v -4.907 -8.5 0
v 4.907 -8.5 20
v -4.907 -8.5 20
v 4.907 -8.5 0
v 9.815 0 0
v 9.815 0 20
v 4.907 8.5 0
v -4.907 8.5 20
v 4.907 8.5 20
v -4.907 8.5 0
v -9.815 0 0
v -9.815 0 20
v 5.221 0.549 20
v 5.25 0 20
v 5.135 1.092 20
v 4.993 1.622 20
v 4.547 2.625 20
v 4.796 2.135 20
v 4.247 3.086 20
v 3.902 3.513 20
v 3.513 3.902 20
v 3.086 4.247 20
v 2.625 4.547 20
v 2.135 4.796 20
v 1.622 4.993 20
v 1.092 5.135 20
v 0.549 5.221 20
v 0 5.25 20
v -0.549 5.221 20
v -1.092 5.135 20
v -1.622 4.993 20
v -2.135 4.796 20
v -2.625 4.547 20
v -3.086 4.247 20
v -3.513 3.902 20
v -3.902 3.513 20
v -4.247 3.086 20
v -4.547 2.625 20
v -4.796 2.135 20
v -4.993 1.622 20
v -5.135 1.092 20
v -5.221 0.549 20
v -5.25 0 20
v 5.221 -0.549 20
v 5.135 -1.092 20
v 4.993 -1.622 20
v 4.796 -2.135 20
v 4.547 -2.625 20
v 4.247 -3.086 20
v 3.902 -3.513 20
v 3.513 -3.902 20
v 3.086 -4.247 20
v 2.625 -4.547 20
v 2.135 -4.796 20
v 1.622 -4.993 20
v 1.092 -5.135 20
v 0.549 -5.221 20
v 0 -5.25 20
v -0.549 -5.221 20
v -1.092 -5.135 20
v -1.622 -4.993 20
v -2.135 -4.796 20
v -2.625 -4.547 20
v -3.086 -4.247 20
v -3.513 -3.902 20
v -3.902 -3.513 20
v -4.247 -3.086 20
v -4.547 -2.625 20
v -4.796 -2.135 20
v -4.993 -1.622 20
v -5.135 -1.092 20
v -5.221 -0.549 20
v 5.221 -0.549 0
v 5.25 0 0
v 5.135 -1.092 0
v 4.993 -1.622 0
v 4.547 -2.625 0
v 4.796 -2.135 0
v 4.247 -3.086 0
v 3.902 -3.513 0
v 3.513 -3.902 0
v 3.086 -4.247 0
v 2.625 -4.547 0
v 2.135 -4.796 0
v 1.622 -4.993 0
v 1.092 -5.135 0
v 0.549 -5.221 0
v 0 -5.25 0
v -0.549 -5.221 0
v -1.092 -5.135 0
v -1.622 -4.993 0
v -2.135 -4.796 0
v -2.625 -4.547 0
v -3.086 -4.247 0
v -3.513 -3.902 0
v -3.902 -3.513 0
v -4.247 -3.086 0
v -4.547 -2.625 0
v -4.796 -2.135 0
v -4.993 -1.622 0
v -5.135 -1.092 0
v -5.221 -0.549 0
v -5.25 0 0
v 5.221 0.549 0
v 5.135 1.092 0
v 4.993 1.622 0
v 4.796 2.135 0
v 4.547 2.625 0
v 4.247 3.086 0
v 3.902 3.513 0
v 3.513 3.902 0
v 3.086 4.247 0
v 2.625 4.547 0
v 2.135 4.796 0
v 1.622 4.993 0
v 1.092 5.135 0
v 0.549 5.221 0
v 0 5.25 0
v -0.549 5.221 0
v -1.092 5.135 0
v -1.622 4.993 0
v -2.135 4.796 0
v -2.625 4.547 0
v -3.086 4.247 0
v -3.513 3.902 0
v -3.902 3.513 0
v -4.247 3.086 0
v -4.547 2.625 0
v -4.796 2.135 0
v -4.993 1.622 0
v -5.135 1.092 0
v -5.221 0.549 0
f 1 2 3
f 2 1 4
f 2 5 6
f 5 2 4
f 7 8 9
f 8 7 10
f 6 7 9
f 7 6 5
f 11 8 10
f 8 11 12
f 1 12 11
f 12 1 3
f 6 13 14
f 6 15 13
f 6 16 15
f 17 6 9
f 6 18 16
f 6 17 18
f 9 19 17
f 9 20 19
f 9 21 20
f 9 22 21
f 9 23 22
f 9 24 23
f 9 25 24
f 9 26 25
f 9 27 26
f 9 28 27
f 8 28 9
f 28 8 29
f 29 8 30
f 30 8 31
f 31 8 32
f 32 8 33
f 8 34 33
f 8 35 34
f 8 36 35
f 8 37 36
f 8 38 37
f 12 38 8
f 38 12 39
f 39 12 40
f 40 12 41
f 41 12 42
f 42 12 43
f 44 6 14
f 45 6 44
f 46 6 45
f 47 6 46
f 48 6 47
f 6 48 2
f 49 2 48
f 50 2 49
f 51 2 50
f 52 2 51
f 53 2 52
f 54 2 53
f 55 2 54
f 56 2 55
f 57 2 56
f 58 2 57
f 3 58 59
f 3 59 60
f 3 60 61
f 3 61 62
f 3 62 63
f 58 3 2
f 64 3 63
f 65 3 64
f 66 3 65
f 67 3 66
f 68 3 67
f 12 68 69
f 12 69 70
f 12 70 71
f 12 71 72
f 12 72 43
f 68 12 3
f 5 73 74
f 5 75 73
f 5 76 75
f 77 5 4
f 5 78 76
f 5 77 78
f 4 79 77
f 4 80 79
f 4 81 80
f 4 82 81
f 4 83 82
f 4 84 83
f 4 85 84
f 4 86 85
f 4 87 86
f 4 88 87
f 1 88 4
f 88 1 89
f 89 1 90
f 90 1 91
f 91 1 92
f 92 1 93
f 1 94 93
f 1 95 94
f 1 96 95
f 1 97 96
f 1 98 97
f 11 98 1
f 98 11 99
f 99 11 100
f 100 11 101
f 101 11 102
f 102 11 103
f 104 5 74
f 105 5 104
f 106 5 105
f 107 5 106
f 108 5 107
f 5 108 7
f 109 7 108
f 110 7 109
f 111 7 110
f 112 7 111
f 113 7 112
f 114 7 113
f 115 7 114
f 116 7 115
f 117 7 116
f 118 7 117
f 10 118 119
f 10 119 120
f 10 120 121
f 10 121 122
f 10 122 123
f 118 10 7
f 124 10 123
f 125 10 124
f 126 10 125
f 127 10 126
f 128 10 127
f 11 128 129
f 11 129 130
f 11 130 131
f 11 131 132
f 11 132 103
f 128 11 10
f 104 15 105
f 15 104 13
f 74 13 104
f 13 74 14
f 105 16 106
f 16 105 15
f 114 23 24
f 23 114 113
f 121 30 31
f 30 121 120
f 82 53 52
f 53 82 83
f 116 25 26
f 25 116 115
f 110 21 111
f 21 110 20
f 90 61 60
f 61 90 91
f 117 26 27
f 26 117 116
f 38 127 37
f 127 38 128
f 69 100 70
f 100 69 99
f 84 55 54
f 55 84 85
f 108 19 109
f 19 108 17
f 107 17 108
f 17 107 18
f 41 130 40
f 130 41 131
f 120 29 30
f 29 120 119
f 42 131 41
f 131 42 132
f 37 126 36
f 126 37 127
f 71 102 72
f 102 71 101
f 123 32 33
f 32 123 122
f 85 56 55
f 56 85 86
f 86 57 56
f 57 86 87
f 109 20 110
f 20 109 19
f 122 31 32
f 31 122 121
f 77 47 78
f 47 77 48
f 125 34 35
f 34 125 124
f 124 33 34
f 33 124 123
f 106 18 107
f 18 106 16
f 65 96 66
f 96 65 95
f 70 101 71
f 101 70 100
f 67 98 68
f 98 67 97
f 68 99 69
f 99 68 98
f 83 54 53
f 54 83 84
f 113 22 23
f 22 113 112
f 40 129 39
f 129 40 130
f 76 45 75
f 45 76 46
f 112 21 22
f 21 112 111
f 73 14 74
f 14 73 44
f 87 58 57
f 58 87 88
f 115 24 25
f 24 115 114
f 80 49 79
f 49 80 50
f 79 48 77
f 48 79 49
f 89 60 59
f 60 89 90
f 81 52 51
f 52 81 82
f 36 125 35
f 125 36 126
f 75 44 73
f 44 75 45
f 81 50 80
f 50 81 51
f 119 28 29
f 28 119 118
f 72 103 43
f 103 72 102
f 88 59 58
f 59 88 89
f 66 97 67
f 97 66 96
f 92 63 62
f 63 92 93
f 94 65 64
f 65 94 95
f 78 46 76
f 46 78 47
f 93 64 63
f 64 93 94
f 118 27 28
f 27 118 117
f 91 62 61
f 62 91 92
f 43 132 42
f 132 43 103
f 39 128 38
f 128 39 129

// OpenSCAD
// Hex spacer.
$fn = 60;
eps = 0.02;
inner_d = 10.5;
flat = 17;
length = 20;
difference() { cylinder(d=flat/cos(30),h=length,$fn=6); translate([0,0,-eps]) cylinder(d=inner_d,h=length+2*eps); }
